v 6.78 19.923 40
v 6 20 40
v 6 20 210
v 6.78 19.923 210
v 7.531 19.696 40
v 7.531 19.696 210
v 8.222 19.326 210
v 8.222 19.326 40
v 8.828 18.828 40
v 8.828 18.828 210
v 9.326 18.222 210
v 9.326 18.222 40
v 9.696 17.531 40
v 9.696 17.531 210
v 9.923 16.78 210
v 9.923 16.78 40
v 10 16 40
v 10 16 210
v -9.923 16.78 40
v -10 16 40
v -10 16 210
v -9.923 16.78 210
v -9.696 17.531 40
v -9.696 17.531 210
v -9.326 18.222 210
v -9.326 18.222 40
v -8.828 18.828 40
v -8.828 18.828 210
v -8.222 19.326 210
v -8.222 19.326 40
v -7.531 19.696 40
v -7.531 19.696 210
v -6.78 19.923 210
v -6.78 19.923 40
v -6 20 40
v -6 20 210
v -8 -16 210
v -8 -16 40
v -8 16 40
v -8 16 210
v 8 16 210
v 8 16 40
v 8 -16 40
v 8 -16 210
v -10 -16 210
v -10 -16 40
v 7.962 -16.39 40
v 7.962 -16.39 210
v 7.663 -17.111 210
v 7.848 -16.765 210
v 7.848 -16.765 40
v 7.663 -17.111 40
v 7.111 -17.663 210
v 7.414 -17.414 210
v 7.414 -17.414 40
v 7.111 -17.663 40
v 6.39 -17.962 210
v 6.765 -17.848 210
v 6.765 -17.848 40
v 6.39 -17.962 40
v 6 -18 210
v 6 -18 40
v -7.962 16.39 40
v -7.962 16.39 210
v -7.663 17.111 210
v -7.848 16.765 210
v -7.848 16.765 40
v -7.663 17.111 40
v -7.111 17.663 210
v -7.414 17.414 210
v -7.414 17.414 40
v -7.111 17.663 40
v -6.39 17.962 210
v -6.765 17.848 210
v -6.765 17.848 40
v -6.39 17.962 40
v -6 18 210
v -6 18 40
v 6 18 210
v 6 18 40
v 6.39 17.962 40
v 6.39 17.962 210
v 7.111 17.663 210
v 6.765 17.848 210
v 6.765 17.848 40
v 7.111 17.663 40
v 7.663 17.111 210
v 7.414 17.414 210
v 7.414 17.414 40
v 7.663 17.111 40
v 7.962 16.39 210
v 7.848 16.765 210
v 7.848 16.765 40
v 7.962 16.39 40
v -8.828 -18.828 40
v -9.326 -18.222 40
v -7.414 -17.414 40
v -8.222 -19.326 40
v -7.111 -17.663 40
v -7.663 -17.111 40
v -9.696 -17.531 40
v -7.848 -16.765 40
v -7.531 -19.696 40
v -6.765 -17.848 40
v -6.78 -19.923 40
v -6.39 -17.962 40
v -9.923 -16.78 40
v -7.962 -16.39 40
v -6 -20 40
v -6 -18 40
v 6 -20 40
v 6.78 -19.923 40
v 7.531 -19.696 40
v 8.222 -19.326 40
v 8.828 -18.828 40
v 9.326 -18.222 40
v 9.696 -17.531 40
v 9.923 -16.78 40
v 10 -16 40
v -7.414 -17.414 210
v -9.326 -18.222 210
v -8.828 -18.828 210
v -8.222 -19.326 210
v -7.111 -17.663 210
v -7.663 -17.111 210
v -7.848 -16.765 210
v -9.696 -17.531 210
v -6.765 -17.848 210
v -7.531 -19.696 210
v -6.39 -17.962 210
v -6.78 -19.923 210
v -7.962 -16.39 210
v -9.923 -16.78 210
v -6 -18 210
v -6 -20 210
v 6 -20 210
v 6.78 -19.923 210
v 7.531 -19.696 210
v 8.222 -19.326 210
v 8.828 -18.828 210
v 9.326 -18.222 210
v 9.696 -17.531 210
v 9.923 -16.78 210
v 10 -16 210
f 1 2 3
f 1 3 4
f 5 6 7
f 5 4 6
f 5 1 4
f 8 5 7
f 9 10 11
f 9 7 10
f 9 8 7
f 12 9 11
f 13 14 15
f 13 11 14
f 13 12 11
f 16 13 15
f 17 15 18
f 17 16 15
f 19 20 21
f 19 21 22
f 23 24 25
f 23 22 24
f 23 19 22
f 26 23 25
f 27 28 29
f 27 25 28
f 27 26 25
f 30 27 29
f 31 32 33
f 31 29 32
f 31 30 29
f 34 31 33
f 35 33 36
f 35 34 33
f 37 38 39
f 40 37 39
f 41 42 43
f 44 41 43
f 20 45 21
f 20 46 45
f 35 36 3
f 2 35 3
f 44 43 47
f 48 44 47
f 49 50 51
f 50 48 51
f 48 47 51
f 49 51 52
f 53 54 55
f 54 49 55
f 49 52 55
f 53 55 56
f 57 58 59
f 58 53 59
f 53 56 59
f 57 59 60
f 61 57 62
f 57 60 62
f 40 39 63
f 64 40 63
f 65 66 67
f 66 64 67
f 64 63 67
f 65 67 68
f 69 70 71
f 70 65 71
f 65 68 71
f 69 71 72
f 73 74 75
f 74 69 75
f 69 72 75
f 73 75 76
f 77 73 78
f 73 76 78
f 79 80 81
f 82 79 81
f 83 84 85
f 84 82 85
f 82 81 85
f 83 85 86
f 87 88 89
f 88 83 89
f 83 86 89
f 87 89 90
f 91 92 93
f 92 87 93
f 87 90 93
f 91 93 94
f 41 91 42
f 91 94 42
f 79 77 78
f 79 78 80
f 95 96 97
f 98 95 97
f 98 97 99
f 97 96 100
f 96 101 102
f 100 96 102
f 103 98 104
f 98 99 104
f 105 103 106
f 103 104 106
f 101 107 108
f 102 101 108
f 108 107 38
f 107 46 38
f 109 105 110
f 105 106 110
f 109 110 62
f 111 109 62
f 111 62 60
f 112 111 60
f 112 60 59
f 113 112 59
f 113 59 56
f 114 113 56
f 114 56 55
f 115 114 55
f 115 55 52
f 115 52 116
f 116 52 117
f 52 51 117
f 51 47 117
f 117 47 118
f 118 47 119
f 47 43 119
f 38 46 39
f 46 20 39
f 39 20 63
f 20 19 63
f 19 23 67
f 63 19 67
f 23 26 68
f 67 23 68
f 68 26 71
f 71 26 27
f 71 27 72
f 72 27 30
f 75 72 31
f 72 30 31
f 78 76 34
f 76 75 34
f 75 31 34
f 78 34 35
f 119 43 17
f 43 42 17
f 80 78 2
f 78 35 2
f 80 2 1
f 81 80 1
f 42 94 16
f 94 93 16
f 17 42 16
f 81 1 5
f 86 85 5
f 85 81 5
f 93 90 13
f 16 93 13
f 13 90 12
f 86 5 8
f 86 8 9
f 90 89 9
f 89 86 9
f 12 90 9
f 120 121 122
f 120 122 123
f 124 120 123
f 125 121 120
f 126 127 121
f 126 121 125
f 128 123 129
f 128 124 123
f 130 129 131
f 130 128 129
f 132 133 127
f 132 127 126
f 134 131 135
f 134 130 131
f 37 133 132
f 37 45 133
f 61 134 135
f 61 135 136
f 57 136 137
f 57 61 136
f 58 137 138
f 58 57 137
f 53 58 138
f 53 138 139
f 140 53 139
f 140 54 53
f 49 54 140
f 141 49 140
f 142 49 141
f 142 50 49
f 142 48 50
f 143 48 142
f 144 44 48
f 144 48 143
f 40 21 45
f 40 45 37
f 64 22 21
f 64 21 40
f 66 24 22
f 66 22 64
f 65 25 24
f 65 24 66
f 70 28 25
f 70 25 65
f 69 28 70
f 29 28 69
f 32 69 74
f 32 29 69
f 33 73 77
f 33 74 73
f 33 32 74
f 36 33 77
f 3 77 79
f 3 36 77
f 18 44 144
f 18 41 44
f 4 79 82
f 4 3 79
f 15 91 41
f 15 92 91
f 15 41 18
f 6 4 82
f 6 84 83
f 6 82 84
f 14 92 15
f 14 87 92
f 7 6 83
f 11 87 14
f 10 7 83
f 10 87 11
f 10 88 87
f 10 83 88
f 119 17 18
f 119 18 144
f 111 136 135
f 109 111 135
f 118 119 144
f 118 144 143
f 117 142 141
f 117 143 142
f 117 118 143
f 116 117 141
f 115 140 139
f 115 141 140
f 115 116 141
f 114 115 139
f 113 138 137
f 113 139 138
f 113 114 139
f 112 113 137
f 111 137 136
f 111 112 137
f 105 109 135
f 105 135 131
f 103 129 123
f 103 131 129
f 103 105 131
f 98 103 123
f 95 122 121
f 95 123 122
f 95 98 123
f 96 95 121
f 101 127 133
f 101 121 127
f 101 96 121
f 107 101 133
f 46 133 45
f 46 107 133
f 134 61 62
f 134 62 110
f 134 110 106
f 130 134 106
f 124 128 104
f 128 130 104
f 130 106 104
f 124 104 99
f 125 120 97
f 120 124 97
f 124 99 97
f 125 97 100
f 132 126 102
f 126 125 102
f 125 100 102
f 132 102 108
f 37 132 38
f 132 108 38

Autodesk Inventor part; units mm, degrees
ref_plane "Start Plane" through (0, 0, 40) normal (0, 0, 1) x (1, 0, 0)
ref_plane "End Plane" through (0, 0, 210) normal (0, 0, 1) x (1, 0, 0)
sketch "Sketch" plane through (0, 0, 0) normal (0, 0, 1) x (1, 0, 0)
  line L0 (-10, -16) -> (-10, 16)
  line L1 (-6, 20) -> (6, 20)
  line L2 (10, 16) -> (10, -16)
  line L3 (6, -20) -> (-6, -20)
  arc A0 (-10, -16) -> (-6, -20) centre (-6, -16) ccw
  arc A1 (10, 16) -> (6, 20) centre (6, 16) ccw
  arc A2 (-6, 20) -> (-10, 16) centre (-6, 16) ccw
  arc A3 (6, -20) -> (10, -16) centre (6, -16) ccw
  arc A4 (-6, 18) -> (-8, 16) centre (-6, 16) ccw
  line L4 (-6, 18) -> (6, 18)
  arc A5 (8, 16) -> (6, 18) centre (6, 16) ccw
  line L5 (8, 16) -> (8, -16)
  arc A6 (6, -18) -> (8, -16) centre (6, -16) ccw
  line L6 (6, -18) -> (-6, -18)
  arc A7 (-8, -16) -> (-6, -18) centre (-6, -16) ccw
  line L7 (-8, -16) -> (-8, 16)
  line L8 (0, 29.1598) -> (0, -29.1598) construction
  line L9 (-15.1598, 0) -> (15.1598, 0) construction
  dimension "d7" = 4
  dimension "d9" = 20
  dimension "d11" = 40
  dimension "d12" = 2
  dimension "d15" = 10
  dimension "d16" = 20
extrude "Body" add sketch "Sketch" along normal up to surface (170 mm away) from surface at 40
sketch "Sketch3" plane through (0, 0, 0) normal (0, 0, 1) x (1, 0, 0)
  line L0 (0, 0) -> (10, 0)
ref_plane "Work Plane3" through (0, 0, 0) normal (0, -1, 0) x (1, 0, 0)
ref_plane "Work Plane4" through (-6, 20, 40) normal (0, 0, -1) x (-1, 0, 0)
split "Split1" plane through (-6, 20, 40) removes the side toward (0, 0, -1)
ref_plane "Work Plane5" through (-6, -580, 210) normal (0, 0, 1) x (1, 0, 0)
split "Split2" plane through (-6, -580, 210) removes the side toward (0, 0, 1)
sketch "Sketch4" plane through (0, 0, 0) normal (0, -1, 0) x (1, 0, 0)
  line L0 (-2, 40) -> (12, 40) projected
  line L1 (-2, 210) -> (12, 210) projected
  dimension "d18" = 170
equation "\"d7\" = G_IR"
equation "\"d9\" = G_W"
equation "\"d11\" = G_H"
equation "\"d12\" = G_T"
equation "\"d15\" = 0.5 * d9"
equation "\"d16\" = 0.5 * d11"
equation "\"d3\" = G_L"
equation "\"G_W\" = 20"
equation "\"G_H\" = 40"
equation "\"G_T\" = 2"
equation "\"G_IR\" = 4"
equation "\"G_L\" = d18"
properties part number "ISO 10799-2 - 40x20x2 - 170" material "Steel, Mild"
